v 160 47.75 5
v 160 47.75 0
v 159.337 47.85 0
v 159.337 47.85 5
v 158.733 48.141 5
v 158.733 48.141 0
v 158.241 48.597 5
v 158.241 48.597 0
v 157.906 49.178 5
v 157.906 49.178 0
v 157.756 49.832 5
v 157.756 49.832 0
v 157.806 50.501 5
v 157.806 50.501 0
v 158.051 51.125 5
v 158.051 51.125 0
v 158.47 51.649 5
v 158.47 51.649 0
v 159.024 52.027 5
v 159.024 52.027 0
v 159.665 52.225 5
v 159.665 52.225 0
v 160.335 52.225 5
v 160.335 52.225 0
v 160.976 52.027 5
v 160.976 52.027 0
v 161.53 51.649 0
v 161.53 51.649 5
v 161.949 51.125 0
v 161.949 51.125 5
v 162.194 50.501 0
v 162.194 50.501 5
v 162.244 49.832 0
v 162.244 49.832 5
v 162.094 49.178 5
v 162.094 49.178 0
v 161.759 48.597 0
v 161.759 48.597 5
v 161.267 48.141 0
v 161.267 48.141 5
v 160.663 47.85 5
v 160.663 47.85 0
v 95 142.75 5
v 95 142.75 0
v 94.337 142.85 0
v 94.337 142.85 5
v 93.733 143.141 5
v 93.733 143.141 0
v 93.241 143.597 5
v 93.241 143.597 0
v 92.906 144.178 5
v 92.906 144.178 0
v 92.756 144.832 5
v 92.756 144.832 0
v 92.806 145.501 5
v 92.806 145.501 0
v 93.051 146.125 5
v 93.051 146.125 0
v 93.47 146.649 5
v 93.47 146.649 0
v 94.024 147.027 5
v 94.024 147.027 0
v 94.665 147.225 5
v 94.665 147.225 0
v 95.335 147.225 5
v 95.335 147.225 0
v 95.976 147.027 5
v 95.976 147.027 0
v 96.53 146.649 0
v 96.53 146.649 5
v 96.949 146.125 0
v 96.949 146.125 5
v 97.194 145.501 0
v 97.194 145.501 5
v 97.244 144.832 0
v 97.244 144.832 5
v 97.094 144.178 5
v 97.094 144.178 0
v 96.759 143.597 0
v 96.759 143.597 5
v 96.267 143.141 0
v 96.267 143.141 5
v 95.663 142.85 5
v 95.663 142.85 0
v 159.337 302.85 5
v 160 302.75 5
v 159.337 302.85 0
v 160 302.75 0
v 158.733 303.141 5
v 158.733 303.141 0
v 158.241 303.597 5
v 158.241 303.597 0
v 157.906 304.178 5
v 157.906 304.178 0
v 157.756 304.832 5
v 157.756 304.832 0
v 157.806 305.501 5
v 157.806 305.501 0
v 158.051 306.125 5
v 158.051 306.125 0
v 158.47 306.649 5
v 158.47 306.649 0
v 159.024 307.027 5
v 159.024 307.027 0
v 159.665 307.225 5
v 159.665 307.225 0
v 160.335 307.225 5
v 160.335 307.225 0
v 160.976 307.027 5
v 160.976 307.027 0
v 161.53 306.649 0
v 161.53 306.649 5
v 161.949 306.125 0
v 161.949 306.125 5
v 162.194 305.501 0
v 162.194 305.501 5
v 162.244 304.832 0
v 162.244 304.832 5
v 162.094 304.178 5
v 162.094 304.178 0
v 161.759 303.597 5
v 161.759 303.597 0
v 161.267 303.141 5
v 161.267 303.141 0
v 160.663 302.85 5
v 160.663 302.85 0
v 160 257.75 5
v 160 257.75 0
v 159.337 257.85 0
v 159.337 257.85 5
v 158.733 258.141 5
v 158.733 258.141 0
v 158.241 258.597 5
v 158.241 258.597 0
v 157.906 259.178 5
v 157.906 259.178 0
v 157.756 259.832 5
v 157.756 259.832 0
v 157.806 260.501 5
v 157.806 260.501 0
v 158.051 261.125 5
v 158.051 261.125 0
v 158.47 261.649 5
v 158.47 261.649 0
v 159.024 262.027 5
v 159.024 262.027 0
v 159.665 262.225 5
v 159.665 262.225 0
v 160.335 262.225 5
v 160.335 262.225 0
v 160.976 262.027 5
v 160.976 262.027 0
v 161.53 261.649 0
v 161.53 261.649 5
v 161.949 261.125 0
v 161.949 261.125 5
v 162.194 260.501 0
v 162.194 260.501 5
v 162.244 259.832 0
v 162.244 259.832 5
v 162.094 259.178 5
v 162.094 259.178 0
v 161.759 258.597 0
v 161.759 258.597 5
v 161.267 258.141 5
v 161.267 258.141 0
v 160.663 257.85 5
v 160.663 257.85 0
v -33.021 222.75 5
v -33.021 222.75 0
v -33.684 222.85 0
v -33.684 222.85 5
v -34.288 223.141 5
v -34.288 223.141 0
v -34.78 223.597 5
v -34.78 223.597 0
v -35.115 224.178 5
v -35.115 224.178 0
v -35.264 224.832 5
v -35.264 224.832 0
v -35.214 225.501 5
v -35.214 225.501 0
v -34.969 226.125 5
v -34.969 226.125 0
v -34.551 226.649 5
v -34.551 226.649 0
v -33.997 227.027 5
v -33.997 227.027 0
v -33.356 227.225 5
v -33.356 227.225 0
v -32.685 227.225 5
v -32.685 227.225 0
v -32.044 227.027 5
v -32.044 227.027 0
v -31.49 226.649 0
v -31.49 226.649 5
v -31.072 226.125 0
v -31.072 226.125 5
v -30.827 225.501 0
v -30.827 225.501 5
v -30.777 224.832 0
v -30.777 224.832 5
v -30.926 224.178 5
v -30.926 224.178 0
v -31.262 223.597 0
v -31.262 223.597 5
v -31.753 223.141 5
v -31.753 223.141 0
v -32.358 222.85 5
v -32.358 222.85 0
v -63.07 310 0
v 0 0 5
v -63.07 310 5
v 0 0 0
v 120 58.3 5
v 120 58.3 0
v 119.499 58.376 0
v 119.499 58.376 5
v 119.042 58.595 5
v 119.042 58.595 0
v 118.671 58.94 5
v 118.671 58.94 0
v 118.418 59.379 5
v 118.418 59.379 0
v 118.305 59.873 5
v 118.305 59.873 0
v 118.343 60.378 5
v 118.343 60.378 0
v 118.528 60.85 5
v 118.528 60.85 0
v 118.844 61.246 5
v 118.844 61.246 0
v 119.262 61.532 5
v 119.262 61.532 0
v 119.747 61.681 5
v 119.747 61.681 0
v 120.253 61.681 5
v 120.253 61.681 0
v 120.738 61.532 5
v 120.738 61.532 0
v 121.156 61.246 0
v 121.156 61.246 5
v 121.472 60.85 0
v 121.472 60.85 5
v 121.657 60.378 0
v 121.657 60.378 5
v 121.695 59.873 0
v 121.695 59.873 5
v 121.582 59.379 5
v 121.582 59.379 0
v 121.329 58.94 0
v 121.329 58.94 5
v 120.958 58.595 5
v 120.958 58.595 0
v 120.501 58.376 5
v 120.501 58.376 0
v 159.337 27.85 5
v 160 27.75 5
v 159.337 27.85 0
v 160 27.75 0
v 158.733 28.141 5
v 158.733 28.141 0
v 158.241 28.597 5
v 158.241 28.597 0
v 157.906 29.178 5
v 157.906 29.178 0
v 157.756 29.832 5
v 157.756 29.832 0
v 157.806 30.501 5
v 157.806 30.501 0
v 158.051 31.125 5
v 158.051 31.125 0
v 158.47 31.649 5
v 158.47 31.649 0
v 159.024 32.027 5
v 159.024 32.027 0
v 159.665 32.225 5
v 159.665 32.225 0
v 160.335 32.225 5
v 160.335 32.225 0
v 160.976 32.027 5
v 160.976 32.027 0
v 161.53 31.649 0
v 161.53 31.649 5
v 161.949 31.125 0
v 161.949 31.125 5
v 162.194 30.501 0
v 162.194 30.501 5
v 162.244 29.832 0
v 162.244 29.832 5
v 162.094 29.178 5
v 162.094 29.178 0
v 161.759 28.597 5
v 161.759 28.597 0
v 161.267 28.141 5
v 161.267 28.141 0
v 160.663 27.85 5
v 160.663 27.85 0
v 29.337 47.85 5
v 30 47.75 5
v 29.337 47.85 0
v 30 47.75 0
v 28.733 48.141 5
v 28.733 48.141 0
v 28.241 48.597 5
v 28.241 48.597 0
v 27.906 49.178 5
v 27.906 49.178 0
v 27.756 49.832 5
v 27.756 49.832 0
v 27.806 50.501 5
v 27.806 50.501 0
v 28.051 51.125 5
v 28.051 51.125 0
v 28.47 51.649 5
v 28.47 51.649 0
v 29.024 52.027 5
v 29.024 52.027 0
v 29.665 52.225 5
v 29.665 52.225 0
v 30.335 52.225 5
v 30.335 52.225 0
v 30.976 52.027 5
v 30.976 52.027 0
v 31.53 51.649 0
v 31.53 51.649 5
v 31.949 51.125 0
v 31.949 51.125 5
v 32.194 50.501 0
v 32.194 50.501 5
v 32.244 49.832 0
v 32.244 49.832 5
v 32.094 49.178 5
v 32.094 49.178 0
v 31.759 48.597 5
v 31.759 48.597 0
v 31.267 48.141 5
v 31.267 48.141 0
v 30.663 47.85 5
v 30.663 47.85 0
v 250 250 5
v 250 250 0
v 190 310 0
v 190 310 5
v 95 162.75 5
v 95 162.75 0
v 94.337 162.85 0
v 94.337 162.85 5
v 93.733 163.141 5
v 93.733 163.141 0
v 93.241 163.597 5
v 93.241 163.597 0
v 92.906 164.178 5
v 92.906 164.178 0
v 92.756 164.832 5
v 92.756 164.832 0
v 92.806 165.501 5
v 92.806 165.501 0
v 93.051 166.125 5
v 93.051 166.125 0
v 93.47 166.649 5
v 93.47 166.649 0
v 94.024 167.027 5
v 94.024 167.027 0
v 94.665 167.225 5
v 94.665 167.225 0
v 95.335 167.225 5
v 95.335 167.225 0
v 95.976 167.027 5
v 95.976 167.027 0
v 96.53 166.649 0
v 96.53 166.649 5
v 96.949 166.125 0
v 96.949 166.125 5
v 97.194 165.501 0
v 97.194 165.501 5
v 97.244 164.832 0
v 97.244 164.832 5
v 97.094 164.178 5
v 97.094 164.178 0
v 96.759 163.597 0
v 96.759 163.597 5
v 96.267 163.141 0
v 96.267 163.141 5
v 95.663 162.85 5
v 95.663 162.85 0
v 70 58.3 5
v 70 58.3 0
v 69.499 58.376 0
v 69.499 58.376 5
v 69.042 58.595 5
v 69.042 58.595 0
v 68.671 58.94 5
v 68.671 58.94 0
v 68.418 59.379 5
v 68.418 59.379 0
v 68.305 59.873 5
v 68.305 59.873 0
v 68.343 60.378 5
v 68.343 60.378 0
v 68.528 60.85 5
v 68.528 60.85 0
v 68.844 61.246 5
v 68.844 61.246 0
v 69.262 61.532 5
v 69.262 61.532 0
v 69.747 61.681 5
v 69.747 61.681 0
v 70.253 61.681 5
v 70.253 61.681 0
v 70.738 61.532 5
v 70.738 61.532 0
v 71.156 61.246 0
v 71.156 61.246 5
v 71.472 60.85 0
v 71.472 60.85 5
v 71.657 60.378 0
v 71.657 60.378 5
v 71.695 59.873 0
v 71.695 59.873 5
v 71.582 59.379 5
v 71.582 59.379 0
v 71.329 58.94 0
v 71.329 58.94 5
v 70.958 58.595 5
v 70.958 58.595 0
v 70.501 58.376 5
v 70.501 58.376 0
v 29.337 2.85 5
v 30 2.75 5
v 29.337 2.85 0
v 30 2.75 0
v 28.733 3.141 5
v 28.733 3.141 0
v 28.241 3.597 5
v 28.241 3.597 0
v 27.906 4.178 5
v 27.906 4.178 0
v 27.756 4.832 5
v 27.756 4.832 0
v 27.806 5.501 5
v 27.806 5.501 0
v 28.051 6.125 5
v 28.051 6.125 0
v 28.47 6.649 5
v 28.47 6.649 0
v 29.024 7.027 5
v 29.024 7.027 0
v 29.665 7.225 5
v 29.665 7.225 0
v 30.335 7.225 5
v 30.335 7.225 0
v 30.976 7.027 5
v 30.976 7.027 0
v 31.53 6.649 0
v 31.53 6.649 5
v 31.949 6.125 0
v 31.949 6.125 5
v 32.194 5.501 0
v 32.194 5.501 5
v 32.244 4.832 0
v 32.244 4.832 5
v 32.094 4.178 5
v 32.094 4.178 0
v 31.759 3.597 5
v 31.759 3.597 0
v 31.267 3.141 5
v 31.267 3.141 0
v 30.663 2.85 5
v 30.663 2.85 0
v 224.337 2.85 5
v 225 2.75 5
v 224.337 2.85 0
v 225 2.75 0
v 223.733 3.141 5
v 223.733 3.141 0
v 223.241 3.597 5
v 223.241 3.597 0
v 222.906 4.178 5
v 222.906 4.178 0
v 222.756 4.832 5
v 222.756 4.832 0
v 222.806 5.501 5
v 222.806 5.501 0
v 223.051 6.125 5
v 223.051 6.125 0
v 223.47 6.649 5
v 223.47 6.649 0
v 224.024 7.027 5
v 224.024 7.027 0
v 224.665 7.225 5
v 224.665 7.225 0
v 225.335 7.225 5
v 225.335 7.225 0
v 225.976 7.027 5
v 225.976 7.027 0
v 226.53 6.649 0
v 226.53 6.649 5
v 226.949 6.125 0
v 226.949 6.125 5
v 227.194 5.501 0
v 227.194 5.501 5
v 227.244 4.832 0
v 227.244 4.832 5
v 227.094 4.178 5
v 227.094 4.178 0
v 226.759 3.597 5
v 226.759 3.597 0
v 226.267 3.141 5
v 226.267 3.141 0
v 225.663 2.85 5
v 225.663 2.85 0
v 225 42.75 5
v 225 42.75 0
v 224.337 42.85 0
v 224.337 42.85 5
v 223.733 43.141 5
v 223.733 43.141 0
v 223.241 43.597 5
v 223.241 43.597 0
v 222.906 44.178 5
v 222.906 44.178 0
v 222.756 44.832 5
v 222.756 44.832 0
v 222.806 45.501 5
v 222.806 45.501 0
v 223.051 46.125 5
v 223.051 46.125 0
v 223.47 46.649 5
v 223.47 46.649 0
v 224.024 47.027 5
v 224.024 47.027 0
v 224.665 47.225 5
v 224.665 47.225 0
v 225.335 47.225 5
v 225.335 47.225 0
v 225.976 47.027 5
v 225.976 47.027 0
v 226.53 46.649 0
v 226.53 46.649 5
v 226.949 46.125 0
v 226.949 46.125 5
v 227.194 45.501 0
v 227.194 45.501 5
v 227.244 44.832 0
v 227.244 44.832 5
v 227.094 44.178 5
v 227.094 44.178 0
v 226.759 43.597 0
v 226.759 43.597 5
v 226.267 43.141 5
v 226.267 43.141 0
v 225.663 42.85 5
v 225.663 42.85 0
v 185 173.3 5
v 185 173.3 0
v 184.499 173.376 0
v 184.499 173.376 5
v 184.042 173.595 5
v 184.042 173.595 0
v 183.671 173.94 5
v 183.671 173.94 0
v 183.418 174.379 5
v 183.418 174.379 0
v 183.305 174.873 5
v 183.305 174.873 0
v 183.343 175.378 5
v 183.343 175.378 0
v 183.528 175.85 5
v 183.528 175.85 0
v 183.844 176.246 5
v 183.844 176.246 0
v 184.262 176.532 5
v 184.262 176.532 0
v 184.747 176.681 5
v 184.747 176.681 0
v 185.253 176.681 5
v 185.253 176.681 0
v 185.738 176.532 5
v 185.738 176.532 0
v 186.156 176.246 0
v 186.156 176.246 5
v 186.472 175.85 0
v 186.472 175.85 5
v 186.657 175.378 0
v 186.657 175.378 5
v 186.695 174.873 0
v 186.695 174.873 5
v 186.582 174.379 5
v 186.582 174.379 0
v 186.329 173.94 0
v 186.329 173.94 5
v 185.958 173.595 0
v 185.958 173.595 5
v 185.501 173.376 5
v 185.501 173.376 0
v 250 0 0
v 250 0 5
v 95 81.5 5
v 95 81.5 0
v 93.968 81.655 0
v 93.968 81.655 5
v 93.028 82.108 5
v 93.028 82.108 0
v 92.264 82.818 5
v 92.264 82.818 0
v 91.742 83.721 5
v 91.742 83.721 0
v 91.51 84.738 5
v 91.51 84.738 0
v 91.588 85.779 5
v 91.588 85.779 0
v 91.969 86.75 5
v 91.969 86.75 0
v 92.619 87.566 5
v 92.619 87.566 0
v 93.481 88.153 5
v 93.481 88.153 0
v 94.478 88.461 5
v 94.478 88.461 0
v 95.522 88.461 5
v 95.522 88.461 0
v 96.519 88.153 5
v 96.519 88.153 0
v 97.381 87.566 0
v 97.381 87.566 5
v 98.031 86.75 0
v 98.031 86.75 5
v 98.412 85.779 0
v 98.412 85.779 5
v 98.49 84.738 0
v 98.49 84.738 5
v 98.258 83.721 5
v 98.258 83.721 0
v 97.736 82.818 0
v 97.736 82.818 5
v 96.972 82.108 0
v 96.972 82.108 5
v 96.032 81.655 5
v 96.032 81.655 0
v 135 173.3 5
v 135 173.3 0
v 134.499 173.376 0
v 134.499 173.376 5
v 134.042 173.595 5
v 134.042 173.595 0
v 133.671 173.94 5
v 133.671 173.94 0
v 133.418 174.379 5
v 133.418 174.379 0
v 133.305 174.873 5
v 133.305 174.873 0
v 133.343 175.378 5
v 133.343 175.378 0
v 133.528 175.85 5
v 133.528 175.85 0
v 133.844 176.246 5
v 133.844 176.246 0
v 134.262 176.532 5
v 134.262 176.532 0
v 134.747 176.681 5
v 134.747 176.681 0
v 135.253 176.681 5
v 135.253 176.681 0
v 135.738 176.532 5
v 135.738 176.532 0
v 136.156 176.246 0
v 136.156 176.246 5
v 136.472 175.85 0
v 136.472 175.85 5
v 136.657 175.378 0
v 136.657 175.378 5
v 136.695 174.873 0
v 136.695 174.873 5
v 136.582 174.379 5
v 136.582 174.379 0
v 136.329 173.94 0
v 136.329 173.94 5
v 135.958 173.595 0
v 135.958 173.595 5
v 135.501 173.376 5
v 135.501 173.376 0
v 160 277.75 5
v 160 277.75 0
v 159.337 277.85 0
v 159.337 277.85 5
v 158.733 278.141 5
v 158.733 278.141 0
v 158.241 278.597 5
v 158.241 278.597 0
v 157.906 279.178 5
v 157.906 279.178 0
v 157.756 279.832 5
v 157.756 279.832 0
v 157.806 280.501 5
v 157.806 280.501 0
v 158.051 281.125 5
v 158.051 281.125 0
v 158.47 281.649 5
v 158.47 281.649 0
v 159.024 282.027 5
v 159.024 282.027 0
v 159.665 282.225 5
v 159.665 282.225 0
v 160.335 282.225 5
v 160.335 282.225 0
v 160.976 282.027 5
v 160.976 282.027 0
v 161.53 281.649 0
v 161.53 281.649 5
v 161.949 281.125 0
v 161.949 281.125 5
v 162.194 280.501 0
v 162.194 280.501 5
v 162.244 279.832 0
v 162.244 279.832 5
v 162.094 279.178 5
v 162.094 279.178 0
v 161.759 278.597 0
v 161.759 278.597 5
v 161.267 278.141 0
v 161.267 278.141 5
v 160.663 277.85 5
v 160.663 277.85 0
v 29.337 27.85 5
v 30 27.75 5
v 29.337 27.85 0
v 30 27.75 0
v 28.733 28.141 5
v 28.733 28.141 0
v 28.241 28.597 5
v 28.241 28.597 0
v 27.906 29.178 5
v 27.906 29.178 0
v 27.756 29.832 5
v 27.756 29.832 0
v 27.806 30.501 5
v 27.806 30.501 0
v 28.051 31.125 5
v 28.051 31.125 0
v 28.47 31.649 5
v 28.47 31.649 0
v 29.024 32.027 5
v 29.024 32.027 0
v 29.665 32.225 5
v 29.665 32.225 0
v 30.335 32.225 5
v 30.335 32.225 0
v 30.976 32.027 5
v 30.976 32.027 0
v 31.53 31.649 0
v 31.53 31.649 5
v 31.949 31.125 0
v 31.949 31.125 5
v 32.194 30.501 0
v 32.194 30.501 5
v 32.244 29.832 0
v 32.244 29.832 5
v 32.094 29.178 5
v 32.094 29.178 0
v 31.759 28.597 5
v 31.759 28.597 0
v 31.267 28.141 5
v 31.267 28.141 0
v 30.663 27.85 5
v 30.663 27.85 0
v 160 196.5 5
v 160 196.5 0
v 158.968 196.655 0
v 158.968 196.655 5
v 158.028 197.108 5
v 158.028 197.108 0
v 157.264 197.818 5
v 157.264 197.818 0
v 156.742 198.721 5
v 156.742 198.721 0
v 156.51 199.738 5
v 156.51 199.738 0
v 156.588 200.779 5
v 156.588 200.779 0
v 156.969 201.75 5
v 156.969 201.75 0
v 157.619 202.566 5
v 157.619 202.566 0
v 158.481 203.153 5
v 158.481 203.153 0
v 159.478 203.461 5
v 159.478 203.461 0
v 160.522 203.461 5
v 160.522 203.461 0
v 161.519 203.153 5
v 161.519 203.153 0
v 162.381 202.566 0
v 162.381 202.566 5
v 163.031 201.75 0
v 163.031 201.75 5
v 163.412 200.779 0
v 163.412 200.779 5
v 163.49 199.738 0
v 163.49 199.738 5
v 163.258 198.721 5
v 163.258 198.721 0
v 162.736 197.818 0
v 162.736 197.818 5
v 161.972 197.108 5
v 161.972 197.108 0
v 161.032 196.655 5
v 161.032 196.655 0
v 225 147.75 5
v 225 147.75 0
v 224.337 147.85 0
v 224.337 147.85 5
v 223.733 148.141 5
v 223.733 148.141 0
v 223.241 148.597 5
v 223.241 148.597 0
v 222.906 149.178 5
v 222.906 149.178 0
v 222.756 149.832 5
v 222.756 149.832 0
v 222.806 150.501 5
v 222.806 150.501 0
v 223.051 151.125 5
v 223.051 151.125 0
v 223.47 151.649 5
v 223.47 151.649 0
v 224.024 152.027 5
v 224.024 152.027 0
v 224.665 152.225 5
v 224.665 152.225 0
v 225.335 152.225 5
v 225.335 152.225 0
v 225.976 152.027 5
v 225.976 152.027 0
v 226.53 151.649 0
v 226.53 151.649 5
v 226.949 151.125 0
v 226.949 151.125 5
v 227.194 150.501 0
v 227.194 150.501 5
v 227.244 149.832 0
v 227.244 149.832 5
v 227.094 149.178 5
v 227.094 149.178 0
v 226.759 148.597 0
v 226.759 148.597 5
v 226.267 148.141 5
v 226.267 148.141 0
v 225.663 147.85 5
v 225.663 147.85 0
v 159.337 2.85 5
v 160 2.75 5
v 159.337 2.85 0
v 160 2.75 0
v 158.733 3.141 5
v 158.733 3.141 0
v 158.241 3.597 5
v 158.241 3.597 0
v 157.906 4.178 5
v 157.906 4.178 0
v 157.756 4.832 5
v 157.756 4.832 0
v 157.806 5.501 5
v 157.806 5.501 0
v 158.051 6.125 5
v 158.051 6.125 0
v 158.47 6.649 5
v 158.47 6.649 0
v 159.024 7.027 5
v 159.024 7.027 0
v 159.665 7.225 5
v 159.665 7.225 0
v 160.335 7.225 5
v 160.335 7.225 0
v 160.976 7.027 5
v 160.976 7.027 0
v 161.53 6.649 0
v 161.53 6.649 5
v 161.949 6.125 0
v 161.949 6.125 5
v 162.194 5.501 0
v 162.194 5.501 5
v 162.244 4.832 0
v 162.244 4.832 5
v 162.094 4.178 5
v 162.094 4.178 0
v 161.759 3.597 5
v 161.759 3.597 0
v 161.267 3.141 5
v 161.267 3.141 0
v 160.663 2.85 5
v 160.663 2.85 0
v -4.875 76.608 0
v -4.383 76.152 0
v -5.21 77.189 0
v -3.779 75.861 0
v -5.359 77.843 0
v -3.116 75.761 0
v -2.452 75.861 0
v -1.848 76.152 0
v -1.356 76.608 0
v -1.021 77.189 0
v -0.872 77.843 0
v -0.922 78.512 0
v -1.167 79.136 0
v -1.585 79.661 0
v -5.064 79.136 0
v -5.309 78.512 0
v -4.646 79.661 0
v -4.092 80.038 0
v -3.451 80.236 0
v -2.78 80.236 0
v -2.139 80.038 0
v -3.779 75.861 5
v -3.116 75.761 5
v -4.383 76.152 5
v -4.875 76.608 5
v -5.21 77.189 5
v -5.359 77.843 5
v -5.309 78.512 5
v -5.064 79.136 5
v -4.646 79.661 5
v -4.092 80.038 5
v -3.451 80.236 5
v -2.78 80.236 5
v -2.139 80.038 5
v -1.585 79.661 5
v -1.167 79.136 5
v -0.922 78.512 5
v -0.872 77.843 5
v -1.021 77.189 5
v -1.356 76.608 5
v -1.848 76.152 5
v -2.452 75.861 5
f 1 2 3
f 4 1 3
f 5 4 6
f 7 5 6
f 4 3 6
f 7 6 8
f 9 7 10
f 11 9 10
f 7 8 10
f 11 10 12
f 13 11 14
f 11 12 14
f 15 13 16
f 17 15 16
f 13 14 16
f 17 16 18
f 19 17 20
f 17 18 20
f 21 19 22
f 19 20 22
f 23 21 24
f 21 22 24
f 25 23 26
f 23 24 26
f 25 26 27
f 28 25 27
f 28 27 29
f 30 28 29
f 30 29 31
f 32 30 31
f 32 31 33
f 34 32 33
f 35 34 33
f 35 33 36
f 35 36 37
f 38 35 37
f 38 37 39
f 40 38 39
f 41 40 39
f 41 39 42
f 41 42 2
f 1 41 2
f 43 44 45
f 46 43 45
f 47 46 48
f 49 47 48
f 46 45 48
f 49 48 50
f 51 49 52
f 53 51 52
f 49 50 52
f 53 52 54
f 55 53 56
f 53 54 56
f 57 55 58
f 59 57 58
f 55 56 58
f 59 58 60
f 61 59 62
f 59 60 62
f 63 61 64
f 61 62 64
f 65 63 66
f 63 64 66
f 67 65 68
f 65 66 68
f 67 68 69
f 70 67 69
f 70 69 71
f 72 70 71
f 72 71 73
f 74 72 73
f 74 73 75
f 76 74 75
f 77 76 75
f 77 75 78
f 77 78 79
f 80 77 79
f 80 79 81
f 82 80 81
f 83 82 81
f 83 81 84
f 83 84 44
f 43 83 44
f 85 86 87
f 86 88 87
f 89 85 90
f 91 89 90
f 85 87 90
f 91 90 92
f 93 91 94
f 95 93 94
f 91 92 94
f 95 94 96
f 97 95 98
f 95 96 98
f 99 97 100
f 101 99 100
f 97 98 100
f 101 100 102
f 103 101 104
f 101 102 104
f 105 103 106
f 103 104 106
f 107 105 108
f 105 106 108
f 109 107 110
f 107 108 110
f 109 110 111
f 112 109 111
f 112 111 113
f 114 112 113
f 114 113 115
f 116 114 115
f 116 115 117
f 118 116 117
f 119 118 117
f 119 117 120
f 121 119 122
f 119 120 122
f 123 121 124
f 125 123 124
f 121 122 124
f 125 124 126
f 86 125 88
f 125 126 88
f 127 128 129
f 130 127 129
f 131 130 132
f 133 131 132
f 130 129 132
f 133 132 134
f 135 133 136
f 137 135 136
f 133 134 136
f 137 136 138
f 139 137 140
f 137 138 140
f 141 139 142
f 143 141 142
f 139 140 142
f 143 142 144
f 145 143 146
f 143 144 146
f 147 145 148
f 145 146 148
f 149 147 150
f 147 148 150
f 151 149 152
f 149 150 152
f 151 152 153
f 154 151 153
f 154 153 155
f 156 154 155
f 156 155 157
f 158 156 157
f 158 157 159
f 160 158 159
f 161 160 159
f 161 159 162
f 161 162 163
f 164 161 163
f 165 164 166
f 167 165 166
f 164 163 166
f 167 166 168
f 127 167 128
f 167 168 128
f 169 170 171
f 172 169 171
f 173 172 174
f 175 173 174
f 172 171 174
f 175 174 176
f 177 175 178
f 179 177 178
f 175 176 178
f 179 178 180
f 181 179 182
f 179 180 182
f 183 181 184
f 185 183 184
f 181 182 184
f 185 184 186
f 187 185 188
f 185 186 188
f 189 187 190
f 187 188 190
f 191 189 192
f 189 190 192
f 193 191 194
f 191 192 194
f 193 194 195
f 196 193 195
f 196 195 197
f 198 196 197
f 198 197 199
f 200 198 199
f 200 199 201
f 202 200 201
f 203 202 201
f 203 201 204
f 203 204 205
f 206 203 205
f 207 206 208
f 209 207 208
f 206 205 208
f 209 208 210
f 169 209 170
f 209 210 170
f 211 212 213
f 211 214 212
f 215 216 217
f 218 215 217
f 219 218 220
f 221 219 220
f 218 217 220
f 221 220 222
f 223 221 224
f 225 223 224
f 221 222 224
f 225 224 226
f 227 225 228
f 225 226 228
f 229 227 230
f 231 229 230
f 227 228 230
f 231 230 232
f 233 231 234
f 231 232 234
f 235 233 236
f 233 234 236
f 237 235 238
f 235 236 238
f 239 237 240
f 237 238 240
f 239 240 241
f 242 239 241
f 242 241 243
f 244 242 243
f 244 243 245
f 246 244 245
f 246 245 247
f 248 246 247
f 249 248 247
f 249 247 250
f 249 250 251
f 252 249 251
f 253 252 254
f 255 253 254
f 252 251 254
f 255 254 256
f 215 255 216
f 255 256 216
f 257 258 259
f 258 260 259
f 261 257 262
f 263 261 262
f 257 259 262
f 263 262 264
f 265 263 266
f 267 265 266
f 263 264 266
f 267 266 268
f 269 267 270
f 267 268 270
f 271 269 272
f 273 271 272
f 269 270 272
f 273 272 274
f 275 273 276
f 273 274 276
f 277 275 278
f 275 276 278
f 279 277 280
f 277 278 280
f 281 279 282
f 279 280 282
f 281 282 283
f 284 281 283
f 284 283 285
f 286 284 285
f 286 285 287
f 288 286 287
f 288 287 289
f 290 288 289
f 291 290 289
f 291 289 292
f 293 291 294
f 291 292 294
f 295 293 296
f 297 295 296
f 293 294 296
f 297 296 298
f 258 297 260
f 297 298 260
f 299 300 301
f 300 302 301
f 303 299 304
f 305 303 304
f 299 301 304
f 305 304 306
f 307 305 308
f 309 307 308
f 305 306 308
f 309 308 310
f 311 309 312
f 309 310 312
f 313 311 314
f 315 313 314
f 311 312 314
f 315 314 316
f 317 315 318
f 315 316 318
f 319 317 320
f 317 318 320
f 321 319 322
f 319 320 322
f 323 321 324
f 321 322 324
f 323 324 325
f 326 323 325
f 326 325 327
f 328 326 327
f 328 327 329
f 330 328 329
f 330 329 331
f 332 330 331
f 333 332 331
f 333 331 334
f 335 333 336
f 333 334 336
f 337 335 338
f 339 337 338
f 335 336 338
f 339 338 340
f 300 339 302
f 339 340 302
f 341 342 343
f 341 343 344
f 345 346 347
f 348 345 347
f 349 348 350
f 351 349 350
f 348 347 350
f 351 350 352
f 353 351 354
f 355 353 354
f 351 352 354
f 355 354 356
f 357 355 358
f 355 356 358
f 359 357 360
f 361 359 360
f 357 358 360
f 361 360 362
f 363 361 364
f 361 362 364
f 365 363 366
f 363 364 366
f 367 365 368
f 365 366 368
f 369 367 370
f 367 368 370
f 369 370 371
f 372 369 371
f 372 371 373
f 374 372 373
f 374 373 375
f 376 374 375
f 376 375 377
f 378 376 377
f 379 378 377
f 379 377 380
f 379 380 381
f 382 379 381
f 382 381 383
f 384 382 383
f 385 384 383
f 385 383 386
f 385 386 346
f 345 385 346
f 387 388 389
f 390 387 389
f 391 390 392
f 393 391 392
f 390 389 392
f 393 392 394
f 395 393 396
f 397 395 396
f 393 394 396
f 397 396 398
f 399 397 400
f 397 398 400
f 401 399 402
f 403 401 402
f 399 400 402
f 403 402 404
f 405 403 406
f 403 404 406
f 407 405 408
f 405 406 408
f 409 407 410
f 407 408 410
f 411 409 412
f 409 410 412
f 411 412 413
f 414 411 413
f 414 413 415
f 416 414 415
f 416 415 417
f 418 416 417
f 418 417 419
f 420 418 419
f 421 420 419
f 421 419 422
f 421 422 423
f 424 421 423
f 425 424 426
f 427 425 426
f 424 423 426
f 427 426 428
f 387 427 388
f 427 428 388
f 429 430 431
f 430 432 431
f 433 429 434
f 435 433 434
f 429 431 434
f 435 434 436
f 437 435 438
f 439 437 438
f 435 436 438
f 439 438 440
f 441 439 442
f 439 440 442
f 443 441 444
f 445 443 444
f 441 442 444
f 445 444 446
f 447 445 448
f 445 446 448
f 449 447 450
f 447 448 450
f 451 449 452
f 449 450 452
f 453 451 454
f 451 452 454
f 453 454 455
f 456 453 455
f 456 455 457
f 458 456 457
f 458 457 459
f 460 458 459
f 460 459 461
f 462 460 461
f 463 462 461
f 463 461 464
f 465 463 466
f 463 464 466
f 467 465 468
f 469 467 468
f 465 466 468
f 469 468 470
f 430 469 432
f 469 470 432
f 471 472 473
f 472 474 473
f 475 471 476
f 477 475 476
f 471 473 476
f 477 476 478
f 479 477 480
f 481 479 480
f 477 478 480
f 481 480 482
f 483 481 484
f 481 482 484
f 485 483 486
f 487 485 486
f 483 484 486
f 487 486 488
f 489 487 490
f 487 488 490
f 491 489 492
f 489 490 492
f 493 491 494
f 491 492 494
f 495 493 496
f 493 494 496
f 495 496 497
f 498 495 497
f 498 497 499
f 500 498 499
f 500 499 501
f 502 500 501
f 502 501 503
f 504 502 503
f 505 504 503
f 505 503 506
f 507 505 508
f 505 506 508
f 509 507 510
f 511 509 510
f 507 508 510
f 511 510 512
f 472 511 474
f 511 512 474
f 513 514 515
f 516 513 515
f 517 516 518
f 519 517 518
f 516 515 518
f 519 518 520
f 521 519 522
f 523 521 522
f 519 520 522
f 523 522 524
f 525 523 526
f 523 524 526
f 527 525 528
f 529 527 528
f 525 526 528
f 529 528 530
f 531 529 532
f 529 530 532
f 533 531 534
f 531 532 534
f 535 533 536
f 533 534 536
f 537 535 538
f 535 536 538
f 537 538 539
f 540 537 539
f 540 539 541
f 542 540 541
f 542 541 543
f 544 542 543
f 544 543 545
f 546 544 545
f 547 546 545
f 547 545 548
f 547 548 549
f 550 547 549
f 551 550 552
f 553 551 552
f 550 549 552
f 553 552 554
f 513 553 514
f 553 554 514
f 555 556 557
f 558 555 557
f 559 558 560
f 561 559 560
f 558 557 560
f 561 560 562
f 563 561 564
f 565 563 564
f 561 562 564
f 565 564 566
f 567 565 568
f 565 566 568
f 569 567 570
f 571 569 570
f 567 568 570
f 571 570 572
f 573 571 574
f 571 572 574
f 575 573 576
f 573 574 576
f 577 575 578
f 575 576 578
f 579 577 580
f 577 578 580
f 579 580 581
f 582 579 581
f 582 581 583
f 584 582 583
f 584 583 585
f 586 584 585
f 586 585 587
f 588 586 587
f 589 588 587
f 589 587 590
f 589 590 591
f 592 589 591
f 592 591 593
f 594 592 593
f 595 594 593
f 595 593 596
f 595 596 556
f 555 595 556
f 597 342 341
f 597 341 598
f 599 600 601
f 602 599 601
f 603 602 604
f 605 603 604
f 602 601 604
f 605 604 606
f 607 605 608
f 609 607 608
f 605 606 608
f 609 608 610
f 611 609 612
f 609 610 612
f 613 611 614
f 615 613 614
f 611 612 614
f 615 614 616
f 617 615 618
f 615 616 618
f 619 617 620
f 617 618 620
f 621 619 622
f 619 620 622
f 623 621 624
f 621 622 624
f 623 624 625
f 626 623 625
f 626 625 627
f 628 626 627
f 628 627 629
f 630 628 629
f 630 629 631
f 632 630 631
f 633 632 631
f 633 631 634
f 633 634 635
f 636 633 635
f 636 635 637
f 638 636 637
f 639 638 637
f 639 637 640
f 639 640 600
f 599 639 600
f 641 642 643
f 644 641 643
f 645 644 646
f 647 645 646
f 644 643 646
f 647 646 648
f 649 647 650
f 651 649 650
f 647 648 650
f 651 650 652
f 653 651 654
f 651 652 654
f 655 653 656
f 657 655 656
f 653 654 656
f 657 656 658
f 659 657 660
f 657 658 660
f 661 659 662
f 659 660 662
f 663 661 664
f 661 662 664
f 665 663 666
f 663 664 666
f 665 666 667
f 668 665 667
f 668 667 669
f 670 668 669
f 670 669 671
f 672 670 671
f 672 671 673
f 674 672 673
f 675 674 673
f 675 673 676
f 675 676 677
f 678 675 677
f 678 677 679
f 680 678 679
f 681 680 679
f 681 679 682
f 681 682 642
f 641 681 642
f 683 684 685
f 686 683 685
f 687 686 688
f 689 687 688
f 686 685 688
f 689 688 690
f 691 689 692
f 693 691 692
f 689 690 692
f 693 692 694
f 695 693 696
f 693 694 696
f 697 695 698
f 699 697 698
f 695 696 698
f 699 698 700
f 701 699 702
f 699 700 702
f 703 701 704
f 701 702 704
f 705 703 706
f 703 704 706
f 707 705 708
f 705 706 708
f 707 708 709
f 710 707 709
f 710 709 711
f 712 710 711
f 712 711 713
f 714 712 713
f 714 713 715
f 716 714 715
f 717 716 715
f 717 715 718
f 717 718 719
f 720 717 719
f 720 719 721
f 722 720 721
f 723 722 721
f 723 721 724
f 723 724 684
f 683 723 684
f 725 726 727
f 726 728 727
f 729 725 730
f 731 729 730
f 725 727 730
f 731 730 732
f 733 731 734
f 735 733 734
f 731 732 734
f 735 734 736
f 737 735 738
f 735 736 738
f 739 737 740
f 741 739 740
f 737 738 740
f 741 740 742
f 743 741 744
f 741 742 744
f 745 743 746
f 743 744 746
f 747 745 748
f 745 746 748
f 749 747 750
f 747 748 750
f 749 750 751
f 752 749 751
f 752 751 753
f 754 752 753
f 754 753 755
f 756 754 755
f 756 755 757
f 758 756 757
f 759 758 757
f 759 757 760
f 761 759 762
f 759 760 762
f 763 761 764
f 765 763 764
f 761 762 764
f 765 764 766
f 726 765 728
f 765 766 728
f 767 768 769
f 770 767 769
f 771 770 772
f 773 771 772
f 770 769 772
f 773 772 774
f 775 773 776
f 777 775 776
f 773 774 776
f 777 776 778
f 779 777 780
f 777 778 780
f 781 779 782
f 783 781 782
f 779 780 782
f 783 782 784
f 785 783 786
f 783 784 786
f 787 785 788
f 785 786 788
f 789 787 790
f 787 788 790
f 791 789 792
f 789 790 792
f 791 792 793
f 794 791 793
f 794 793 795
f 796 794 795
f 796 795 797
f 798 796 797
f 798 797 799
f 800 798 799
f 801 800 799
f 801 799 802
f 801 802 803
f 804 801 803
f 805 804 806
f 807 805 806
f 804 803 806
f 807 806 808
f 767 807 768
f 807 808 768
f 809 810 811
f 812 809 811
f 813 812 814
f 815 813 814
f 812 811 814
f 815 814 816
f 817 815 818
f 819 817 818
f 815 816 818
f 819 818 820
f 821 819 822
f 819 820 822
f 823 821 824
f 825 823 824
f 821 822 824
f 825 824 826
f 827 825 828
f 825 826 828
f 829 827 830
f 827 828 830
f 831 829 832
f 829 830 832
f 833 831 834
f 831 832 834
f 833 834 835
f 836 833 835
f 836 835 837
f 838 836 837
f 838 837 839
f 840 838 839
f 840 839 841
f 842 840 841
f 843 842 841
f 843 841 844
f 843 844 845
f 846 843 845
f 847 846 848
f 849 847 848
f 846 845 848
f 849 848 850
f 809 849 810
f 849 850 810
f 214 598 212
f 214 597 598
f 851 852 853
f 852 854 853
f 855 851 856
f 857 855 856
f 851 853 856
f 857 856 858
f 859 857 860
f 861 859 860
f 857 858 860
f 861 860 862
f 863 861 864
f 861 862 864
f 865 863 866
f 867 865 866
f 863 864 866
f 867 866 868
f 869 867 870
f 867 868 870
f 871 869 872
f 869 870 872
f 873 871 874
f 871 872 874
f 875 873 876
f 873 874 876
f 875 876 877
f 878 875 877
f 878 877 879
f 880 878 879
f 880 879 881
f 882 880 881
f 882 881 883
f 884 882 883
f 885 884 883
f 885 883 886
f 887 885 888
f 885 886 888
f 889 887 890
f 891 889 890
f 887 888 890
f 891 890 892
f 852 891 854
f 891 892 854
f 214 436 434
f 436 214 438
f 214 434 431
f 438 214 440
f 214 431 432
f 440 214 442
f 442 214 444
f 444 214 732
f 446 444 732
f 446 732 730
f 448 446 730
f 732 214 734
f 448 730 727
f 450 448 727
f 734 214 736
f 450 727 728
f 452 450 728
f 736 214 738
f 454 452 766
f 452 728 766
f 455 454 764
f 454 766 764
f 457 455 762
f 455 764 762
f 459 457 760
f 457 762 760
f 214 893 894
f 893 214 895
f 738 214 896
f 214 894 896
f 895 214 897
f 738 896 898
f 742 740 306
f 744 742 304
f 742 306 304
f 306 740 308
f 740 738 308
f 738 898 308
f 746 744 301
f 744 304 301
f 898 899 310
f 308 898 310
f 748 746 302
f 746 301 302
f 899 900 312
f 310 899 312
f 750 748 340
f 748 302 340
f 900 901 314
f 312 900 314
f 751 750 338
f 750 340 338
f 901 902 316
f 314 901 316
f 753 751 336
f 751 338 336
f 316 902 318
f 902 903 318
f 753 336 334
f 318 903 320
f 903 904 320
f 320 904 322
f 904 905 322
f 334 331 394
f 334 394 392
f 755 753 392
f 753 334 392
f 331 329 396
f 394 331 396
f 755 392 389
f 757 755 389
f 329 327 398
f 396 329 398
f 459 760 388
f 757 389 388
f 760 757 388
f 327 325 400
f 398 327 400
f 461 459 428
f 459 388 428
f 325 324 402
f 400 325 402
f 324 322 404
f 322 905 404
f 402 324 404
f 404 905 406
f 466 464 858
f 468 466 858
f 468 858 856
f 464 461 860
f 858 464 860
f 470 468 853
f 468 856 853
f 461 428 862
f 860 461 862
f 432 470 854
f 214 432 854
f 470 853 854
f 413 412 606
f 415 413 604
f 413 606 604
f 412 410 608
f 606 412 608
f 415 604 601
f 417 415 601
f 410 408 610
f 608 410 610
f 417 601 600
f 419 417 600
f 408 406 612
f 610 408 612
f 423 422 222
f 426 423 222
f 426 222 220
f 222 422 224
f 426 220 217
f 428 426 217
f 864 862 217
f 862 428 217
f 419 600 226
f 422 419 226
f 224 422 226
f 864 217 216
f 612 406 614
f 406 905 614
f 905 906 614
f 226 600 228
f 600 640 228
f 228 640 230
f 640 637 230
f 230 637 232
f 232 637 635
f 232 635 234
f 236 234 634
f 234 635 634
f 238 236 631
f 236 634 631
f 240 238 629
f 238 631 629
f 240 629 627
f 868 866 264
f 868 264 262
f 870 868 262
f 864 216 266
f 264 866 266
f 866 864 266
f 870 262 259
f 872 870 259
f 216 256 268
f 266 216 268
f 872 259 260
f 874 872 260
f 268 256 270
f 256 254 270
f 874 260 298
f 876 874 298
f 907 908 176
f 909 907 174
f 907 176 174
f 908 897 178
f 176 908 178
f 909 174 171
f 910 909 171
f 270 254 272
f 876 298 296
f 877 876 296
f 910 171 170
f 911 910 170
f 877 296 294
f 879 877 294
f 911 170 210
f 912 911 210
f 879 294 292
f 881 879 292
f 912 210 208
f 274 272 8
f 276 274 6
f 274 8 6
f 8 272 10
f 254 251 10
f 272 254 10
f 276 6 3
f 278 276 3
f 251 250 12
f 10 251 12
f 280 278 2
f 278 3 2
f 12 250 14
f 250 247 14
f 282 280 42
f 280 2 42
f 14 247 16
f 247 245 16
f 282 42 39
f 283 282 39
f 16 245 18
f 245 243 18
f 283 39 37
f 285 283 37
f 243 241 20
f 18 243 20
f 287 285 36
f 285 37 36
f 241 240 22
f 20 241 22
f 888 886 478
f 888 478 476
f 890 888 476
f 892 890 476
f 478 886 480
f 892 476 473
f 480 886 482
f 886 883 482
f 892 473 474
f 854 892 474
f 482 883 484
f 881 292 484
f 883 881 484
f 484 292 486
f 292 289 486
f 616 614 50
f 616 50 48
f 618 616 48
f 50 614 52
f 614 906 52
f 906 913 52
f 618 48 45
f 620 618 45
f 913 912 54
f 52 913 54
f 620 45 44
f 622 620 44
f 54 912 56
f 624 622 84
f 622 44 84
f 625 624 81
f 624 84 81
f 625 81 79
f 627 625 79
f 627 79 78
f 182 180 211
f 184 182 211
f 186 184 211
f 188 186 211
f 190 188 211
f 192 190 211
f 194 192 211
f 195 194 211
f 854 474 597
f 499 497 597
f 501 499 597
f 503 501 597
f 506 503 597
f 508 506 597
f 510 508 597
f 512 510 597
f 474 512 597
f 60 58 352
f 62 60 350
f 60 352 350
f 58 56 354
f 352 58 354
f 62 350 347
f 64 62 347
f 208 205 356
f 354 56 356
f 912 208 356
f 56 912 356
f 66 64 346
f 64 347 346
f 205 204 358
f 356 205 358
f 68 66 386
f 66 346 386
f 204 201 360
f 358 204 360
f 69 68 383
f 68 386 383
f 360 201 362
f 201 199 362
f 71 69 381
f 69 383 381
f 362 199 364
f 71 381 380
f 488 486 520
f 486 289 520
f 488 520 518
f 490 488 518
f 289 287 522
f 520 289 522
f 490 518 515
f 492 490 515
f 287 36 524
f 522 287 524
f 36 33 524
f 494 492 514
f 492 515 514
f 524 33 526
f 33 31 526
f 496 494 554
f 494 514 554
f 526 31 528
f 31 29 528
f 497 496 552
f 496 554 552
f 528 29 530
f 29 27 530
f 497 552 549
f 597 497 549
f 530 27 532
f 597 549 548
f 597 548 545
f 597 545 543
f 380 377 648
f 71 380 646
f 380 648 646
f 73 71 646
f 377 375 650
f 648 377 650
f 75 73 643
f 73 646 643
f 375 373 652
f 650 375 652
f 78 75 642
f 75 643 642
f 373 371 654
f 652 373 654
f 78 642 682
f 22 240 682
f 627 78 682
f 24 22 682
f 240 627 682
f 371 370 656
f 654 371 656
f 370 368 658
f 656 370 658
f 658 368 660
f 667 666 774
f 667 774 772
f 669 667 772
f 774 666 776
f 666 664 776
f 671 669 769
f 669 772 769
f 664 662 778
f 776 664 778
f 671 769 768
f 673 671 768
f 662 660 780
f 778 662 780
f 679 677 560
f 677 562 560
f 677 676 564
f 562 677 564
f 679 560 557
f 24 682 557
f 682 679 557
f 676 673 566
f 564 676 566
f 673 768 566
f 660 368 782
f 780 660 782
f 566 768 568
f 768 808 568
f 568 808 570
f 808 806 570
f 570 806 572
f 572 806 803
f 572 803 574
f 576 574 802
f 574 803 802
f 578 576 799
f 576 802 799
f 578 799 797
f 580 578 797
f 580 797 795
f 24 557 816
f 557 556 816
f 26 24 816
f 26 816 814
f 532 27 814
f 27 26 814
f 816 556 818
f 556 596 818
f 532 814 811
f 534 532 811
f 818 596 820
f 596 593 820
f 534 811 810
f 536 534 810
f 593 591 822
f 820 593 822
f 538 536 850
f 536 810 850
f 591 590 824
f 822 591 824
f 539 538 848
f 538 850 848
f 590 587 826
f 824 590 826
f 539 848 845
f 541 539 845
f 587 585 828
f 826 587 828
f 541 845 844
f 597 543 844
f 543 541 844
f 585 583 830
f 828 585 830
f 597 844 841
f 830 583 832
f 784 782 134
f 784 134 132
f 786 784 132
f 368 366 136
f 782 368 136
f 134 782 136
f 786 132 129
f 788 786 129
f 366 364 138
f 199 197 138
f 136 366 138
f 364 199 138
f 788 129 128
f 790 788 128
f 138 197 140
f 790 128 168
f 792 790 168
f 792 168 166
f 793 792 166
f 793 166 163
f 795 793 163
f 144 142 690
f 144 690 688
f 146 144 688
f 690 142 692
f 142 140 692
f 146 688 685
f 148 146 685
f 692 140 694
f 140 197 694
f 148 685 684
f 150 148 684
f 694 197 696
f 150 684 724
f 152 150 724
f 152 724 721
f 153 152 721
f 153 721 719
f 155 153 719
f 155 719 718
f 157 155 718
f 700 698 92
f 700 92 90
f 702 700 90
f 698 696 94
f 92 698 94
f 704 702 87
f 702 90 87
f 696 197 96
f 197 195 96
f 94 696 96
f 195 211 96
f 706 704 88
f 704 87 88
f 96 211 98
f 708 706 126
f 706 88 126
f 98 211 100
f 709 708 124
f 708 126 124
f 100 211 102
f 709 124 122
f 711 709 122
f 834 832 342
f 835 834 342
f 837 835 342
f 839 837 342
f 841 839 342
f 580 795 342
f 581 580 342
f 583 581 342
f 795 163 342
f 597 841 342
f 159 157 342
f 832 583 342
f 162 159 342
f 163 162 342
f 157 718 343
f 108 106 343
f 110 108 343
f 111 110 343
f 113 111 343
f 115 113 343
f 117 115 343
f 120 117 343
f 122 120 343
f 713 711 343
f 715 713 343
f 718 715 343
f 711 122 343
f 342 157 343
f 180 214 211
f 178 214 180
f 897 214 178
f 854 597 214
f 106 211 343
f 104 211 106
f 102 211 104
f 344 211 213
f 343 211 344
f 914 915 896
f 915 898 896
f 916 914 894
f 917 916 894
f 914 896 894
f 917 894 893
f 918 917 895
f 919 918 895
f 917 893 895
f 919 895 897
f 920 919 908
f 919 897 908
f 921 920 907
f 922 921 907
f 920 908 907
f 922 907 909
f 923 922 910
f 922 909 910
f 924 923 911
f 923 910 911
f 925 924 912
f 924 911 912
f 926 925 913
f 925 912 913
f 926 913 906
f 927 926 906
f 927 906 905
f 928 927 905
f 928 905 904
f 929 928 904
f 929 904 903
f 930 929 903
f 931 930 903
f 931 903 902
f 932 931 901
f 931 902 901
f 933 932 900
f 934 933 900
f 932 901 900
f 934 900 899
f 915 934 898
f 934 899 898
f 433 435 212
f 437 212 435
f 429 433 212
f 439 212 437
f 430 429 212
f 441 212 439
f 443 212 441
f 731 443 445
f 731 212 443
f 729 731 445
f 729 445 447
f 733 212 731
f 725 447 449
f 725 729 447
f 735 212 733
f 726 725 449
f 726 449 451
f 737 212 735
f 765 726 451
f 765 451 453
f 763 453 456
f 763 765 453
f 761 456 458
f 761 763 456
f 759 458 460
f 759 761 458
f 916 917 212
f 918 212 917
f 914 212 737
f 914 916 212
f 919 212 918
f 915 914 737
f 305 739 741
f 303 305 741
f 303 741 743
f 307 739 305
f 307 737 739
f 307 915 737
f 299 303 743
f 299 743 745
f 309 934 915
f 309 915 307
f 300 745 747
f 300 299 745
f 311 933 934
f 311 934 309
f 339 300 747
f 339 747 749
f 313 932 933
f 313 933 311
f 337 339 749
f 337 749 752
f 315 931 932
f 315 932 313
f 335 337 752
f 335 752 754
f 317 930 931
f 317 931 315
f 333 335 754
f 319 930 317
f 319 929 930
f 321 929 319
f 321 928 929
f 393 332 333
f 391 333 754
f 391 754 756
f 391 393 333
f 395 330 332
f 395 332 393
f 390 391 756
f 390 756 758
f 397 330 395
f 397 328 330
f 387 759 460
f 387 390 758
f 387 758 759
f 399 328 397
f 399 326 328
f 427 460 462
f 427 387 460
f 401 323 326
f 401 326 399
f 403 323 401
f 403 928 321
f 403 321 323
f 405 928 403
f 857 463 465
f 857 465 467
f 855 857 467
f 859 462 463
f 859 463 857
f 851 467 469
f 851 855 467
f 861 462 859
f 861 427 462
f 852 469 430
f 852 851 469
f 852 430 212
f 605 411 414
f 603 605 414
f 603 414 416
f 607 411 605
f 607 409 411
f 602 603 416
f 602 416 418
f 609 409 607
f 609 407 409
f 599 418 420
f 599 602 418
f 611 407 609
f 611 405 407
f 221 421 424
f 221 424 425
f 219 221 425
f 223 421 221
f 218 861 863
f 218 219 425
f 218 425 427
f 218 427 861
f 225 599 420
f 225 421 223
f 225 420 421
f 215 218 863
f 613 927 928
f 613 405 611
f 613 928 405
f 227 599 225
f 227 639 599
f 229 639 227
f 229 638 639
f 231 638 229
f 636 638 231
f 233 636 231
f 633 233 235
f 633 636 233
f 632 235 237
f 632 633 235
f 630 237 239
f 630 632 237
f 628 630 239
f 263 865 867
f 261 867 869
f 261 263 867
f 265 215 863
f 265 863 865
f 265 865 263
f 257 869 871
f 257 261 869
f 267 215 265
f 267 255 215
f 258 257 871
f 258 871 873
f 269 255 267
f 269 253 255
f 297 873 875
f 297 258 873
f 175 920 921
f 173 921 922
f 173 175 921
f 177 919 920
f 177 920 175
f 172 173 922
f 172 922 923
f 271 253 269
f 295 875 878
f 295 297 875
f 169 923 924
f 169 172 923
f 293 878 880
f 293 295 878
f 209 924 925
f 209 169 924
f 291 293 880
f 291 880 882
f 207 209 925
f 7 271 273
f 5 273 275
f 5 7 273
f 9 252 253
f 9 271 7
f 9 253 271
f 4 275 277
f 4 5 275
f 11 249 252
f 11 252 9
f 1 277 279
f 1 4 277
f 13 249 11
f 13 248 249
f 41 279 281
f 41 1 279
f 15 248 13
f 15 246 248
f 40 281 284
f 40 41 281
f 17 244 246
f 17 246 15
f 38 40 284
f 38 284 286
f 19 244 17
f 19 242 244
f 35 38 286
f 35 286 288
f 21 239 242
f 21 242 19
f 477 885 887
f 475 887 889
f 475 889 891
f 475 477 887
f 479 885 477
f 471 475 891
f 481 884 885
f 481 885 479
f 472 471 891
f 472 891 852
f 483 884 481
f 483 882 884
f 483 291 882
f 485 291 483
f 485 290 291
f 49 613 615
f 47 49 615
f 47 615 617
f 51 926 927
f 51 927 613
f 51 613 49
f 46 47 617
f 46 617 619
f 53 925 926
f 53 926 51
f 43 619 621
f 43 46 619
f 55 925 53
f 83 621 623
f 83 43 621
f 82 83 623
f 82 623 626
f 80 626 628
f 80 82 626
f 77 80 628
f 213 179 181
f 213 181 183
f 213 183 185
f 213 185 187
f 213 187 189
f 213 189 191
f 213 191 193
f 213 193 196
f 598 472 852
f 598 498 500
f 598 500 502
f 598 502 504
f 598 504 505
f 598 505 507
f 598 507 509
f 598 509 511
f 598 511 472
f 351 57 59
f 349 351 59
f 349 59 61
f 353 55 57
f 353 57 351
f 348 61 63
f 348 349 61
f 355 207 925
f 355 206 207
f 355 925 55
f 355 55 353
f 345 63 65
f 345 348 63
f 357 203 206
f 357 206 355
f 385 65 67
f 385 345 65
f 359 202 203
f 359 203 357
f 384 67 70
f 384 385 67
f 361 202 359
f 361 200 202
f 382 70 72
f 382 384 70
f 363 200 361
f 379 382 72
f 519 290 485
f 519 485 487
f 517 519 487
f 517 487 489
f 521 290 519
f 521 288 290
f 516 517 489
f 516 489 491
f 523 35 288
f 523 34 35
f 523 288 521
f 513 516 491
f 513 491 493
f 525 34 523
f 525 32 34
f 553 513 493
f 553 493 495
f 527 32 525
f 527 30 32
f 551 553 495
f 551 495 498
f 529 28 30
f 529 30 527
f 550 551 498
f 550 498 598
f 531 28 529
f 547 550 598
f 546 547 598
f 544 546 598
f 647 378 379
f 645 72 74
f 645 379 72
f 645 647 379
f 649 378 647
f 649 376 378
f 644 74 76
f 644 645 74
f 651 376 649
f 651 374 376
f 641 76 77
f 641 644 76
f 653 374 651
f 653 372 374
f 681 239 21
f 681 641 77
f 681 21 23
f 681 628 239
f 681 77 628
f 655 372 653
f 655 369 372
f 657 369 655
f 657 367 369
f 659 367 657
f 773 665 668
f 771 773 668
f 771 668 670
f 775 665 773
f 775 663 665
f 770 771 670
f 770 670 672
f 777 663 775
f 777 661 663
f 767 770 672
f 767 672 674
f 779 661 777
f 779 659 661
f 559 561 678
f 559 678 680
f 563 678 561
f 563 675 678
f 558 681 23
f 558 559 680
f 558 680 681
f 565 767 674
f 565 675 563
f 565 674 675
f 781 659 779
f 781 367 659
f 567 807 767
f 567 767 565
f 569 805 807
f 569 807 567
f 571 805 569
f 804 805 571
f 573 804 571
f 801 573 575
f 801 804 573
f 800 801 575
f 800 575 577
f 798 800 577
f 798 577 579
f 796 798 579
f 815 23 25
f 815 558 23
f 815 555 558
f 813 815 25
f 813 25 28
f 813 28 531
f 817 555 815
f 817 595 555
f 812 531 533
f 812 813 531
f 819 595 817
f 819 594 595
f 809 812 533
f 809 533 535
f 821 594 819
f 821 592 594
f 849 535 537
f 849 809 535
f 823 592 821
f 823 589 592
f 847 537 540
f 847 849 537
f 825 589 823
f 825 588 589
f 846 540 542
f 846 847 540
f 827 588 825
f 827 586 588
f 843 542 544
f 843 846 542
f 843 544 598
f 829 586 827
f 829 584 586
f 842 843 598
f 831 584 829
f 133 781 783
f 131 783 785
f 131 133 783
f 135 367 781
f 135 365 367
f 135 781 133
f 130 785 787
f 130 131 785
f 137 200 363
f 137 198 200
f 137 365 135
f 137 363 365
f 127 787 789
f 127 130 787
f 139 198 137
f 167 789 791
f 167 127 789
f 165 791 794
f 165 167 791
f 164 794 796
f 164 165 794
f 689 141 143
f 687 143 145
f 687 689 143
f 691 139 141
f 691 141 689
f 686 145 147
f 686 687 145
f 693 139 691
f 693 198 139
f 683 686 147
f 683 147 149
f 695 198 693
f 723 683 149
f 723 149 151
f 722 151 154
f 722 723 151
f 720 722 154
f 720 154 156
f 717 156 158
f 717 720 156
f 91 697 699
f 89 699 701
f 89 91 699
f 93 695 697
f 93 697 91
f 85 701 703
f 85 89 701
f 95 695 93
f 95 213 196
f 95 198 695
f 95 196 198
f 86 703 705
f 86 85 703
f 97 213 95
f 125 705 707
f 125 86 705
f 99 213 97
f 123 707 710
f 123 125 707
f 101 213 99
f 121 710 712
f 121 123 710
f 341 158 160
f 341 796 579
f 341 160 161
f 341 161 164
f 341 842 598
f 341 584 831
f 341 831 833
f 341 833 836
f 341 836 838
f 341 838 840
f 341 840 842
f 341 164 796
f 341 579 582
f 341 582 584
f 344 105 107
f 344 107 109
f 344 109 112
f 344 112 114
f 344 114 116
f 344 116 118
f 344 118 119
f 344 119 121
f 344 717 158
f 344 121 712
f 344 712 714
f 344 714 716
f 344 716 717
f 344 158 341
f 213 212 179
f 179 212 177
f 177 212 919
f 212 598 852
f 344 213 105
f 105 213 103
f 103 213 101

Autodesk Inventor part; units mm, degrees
ref_plane "YZ Plane" through (0, 0, 0) normal (1, 0, 0) x (0, 1, 0)
ref_plane "XZ Plane" through (0, 0, 0) normal (0, 1, 0) x (-1, 0, 0)
ref_plane "XY Plane" through (0, 0, 0) normal (0, 0, 1) x (1, 0, 0)
sketch "Sketch1" plane through (0, 0, 0) normal (0, 0, 1) x (1, 0, 0)
  line L0 (0, 0) -> (-63.0702, 310)
  line L1 (-63.0702, 310) -> (250, 310)
  line L2 (250, 310) -> (250, 0)
  line L3 (250, 0) -> (0, 0)
  dimension "d0" = 310
  dimension "d1" = 78.5
  dimension "d2" = 250
extrude "Extrusion1" add sketch "Sketch1" along normal blind 5
sketch "Sketch2" plane through (0, 0, 5) normal (0, 0, 1) x (1, 0, 0)
  line L0 (0, 0) -> (250, 0) projected
  point P0 (160, 280)
  point P1 (160, 260)
  point P2 (95, 165)
  point P3 (95, 145)
  point P4 (225, 150)
  point P5 (225, 45)
  point P6 (30, 50)
  point P7 (30, 30)
  point P8 (160, 50)
  point P9 (160, 30)
  point P10 (160, 305)
  point P11 (30, 5)
  point P12 (160, 5)
  point P13 (225, 5)
  dimension "d7" = 20
  dimension "d15" = 25
  dimension "d20" = 5
  dimension "d21" = 30
  dimension "d30" = 130
  dimension "d32" = 65
  dimension "d36" = 65
  dimension "d92" = 25
  dimension "d93" = 20
  dimension "d94" = 95
  dimension "d95" = 20
  dimension "d96" = 95
  dimension "d97" = 105
  dimension "d98" = 130
  dimension "d99" = 15
hole "Hole1" at (160, 280, 5) at (160, 260, 5) at (95, 165, 5) at (95, 145, 5) at (225, 150, 5) at (225, 45, 5) at (30, 50, 5) at (30, 30, 5) at (160, 50, 5) at (160, 30, 5) at (160, 305, 5) at (30, 5, 5) at (160, 5, 5) at (225, 5, 5) direction (0, 0, -1) diameter 4.5 end through all clearance for "Flat Head Machine Screw" size "M4" standard "Ansi Metric M Profile"
sketch "Sketch3" plane through (0, 0, 5) normal (0, 0, 1) x (1, 0, 0)
  circle A0 centre (30, 5) radius 2.25 projected
  circle A1 centre (160, 30) radius 2.25 projected
  circle A2 centre (30, 30) radius 2.25 projected
  circle A3 centre (225, 45) radius 2.25 projected
  circle A4 centre (95, 145) radius 2.25 projected
  circle A5 centre (160, 260) radius 2.25 projected
  circle A6 centre (160, 280) radius 2.25 projected
  circle A7 centre (95, 165) radius 2.25 projected
  circle A8 centre (225, 150) radius 2.25 projected
  circle A9 centre (30, 50) radius 2.25 projected
  circle A10 centre (160, 50) radius 2.25 projected
  circle A11 centre (160, 5) radius 2.25 projected
  line L0 (-63.0702, 310) -> (0, 0) projected
  line L1 (0, 0) -> (250, 0) projected
  line L2 (250, 0) -> (250, 310) projected
  line L3 (250, 310) -> (-63.0702, 310) projected
  point P0 (160, 200)
  point P1 (95, 85)
  dimension "d37" = 60
  dimension "d89" = 60
hole "Hole2" at (160, 200, 5) at (95, 85, 5) direction (0, 0, -1) diameter 7 end through all
sketch "Sketch4" plane through (0, 0, 5) normal (0, 0, 1) x (1, 0, 0)
  circle A0 centre (95, 85) radius 3.5 projected
  circle A1 centre (160, 200) radius 3.5 projected
  circle A2 centre (30, 5) radius 2.25 projected
  circle A3 centre (160, 30) radius 2.25 projected
  circle A4 centre (30, 30) radius 2.25 projected
  circle A5 centre (225, 45) radius 2.25 projected
  circle A6 centre (95, 145) radius 2.25 projected
  circle A7 centre (160, 260) radius 2.25 projected
  circle A8 centre (160, 280) radius 2.25 projected
  circle A9 centre (95, 165) radius 2.25 projected
  circle A10 centre (225, 150) radius 2.25 projected
  circle A11 centre (30, 50) radius 2.25 projected
  circle A12 centre (160, 50) radius 2.25 projected
  circle A13 centre (160, 5) radius 2.25 projected
  line L0 (-63.0702, 310) -> (0, 0) projected
  line L1 (0, 0) -> (250, 0) projected
  line L2 (250, 0) -> (250, 310) projected
  line L3 (250, 310) -> (-63.0702, 310) projected
  point P0 (185, 175)
  point P1 (135, 175)
  point P2 (70, 60)
  point P3 (120, 60)
  dimension "d46" = 25
  dimension "d47" = 25
  dimension "d48" = 50
  dimension "d49" = 50
  dimension "d50" = 25
hole "Hole3" at (185, 175, 5) at (135, 175, 5) at (70, 60, 5) at (120, 60, 5) direction (0, 0, -1) diameter 3.4 end through all clearance for "Flat Head Machine Screw" size "M3" standard "Ansi Metric M Profile"
chamfer "Chamfer1" distance 60 angle 45 1 edges at (250, 310, 2.5)
sketch "Sketch5" plane through (0, 0, 5) normal (0, 0, 1) x (1, 0, 0)
  line L0 (-63.0702, 310) -> (0, 0) projected
  line L1 (190, 310) -> (-63.0702, 310) projected
  line L2 (0, 0) -> (250, 0) projected
  point P0 (-33.0207, 225)
  point P1 (-3.1155, 78.0113)
  dimension "d64" = 12.5
  dimension "d65" = 12.5
  dimension "d66" = 150
  dimension "d67" = 85
  dimension "d68" = 78.0113
hole "Hole4" at (-33.0207, 225, 5) at (-3.1155, 78.0113, 5) direction (0, 0, -1) diameter 4.5 end through all clearance for "Flat Head Machine Screw" size "M4" standard "Ansi Metric M Profile"
sketch "Sketch6" plane through (0, 0, 5) normal (0, 0, 1) x (1, 0, 0)
  circle A0 centre (-33.0207, 225) radius 2.25 projected
  circle A1 centre (-3.1155, 78.0113) radius 2.25 projected
  line L0 (190, 310) -> (250, 250) projected
  line L1 (190, 310) -> (-63.0702, 310) projected
  line L2 (-63.0702, 310) -> (0, 0) projected
  line L3 (0, 0) -> (250, 0) projected
  line L4 (250, 0) -> (250, 250) projected
  circle A2 centre (70, 60) radius 1.7 projected
  circle A3 centre (185, 175) radius 1.7 projected
  circle A4 centre (135, 175) radius 1.7 projected
  circle A5 centre (120, 60) radius 1.7 projected
  circle A6 centre (95, 85) radius 3.5 projected
  circle A7 centre (160, 200) radius 3.5 projected
  circle A8 centre (30, 5) radius 2.25 projected
  circle A9 centre (160, 30) radius 2.25 projected
  circle A10 centre (30, 30) radius 2.25 projected
  circle A11 centre (225, 45) radius 2.25 projected
  circle A12 centre (95, 145) radius 2.25 projected
  circle A13 centre (95, 165) radius 2.25 projected
  circle A14 centre (225, 150) radius 2.25 projected
  circle A15 centre (30, 50) radius 2.25 projected
  circle A16 centre (160, 50) radius 2.25 projected
  circle A17 centre (160, 5) radius 2.25 projected
  point P0 (95.4041, 170)
  point P1 (115, 174)
  point P2 (205, 174)
  point P3 (224.5959, 170)
  dimension "d76" = 20
  dimension "d77" = 4
  dimension "d78" = 20
  dimension "d79" = 45
  dimension "d80" = 26
  dimension "d81" = 45
hole "Hole5" [suppressed]
equation "\"d7\" = d5"
equation "\"d32\" = 0.5 * d30"
equation "\"d36\" = d32"
equation "\"d93\" = d7"
equation "\"d98\" = 2 * d36"
equation "\"d48\" = 2 * d47"
equation "\"d49\" = d48"
equation "\"d50\" = 0.5 * d49"
equation "\"d65\" = d64"
equation "\"d78\" = d76"
equation "\"d81\" = d79"
equation "\"d5\" = d6"
equation "\"d6\" = 20"
properties part number "Top_Separator Backboard 3 Lanes" material "PMMA Plastic"
